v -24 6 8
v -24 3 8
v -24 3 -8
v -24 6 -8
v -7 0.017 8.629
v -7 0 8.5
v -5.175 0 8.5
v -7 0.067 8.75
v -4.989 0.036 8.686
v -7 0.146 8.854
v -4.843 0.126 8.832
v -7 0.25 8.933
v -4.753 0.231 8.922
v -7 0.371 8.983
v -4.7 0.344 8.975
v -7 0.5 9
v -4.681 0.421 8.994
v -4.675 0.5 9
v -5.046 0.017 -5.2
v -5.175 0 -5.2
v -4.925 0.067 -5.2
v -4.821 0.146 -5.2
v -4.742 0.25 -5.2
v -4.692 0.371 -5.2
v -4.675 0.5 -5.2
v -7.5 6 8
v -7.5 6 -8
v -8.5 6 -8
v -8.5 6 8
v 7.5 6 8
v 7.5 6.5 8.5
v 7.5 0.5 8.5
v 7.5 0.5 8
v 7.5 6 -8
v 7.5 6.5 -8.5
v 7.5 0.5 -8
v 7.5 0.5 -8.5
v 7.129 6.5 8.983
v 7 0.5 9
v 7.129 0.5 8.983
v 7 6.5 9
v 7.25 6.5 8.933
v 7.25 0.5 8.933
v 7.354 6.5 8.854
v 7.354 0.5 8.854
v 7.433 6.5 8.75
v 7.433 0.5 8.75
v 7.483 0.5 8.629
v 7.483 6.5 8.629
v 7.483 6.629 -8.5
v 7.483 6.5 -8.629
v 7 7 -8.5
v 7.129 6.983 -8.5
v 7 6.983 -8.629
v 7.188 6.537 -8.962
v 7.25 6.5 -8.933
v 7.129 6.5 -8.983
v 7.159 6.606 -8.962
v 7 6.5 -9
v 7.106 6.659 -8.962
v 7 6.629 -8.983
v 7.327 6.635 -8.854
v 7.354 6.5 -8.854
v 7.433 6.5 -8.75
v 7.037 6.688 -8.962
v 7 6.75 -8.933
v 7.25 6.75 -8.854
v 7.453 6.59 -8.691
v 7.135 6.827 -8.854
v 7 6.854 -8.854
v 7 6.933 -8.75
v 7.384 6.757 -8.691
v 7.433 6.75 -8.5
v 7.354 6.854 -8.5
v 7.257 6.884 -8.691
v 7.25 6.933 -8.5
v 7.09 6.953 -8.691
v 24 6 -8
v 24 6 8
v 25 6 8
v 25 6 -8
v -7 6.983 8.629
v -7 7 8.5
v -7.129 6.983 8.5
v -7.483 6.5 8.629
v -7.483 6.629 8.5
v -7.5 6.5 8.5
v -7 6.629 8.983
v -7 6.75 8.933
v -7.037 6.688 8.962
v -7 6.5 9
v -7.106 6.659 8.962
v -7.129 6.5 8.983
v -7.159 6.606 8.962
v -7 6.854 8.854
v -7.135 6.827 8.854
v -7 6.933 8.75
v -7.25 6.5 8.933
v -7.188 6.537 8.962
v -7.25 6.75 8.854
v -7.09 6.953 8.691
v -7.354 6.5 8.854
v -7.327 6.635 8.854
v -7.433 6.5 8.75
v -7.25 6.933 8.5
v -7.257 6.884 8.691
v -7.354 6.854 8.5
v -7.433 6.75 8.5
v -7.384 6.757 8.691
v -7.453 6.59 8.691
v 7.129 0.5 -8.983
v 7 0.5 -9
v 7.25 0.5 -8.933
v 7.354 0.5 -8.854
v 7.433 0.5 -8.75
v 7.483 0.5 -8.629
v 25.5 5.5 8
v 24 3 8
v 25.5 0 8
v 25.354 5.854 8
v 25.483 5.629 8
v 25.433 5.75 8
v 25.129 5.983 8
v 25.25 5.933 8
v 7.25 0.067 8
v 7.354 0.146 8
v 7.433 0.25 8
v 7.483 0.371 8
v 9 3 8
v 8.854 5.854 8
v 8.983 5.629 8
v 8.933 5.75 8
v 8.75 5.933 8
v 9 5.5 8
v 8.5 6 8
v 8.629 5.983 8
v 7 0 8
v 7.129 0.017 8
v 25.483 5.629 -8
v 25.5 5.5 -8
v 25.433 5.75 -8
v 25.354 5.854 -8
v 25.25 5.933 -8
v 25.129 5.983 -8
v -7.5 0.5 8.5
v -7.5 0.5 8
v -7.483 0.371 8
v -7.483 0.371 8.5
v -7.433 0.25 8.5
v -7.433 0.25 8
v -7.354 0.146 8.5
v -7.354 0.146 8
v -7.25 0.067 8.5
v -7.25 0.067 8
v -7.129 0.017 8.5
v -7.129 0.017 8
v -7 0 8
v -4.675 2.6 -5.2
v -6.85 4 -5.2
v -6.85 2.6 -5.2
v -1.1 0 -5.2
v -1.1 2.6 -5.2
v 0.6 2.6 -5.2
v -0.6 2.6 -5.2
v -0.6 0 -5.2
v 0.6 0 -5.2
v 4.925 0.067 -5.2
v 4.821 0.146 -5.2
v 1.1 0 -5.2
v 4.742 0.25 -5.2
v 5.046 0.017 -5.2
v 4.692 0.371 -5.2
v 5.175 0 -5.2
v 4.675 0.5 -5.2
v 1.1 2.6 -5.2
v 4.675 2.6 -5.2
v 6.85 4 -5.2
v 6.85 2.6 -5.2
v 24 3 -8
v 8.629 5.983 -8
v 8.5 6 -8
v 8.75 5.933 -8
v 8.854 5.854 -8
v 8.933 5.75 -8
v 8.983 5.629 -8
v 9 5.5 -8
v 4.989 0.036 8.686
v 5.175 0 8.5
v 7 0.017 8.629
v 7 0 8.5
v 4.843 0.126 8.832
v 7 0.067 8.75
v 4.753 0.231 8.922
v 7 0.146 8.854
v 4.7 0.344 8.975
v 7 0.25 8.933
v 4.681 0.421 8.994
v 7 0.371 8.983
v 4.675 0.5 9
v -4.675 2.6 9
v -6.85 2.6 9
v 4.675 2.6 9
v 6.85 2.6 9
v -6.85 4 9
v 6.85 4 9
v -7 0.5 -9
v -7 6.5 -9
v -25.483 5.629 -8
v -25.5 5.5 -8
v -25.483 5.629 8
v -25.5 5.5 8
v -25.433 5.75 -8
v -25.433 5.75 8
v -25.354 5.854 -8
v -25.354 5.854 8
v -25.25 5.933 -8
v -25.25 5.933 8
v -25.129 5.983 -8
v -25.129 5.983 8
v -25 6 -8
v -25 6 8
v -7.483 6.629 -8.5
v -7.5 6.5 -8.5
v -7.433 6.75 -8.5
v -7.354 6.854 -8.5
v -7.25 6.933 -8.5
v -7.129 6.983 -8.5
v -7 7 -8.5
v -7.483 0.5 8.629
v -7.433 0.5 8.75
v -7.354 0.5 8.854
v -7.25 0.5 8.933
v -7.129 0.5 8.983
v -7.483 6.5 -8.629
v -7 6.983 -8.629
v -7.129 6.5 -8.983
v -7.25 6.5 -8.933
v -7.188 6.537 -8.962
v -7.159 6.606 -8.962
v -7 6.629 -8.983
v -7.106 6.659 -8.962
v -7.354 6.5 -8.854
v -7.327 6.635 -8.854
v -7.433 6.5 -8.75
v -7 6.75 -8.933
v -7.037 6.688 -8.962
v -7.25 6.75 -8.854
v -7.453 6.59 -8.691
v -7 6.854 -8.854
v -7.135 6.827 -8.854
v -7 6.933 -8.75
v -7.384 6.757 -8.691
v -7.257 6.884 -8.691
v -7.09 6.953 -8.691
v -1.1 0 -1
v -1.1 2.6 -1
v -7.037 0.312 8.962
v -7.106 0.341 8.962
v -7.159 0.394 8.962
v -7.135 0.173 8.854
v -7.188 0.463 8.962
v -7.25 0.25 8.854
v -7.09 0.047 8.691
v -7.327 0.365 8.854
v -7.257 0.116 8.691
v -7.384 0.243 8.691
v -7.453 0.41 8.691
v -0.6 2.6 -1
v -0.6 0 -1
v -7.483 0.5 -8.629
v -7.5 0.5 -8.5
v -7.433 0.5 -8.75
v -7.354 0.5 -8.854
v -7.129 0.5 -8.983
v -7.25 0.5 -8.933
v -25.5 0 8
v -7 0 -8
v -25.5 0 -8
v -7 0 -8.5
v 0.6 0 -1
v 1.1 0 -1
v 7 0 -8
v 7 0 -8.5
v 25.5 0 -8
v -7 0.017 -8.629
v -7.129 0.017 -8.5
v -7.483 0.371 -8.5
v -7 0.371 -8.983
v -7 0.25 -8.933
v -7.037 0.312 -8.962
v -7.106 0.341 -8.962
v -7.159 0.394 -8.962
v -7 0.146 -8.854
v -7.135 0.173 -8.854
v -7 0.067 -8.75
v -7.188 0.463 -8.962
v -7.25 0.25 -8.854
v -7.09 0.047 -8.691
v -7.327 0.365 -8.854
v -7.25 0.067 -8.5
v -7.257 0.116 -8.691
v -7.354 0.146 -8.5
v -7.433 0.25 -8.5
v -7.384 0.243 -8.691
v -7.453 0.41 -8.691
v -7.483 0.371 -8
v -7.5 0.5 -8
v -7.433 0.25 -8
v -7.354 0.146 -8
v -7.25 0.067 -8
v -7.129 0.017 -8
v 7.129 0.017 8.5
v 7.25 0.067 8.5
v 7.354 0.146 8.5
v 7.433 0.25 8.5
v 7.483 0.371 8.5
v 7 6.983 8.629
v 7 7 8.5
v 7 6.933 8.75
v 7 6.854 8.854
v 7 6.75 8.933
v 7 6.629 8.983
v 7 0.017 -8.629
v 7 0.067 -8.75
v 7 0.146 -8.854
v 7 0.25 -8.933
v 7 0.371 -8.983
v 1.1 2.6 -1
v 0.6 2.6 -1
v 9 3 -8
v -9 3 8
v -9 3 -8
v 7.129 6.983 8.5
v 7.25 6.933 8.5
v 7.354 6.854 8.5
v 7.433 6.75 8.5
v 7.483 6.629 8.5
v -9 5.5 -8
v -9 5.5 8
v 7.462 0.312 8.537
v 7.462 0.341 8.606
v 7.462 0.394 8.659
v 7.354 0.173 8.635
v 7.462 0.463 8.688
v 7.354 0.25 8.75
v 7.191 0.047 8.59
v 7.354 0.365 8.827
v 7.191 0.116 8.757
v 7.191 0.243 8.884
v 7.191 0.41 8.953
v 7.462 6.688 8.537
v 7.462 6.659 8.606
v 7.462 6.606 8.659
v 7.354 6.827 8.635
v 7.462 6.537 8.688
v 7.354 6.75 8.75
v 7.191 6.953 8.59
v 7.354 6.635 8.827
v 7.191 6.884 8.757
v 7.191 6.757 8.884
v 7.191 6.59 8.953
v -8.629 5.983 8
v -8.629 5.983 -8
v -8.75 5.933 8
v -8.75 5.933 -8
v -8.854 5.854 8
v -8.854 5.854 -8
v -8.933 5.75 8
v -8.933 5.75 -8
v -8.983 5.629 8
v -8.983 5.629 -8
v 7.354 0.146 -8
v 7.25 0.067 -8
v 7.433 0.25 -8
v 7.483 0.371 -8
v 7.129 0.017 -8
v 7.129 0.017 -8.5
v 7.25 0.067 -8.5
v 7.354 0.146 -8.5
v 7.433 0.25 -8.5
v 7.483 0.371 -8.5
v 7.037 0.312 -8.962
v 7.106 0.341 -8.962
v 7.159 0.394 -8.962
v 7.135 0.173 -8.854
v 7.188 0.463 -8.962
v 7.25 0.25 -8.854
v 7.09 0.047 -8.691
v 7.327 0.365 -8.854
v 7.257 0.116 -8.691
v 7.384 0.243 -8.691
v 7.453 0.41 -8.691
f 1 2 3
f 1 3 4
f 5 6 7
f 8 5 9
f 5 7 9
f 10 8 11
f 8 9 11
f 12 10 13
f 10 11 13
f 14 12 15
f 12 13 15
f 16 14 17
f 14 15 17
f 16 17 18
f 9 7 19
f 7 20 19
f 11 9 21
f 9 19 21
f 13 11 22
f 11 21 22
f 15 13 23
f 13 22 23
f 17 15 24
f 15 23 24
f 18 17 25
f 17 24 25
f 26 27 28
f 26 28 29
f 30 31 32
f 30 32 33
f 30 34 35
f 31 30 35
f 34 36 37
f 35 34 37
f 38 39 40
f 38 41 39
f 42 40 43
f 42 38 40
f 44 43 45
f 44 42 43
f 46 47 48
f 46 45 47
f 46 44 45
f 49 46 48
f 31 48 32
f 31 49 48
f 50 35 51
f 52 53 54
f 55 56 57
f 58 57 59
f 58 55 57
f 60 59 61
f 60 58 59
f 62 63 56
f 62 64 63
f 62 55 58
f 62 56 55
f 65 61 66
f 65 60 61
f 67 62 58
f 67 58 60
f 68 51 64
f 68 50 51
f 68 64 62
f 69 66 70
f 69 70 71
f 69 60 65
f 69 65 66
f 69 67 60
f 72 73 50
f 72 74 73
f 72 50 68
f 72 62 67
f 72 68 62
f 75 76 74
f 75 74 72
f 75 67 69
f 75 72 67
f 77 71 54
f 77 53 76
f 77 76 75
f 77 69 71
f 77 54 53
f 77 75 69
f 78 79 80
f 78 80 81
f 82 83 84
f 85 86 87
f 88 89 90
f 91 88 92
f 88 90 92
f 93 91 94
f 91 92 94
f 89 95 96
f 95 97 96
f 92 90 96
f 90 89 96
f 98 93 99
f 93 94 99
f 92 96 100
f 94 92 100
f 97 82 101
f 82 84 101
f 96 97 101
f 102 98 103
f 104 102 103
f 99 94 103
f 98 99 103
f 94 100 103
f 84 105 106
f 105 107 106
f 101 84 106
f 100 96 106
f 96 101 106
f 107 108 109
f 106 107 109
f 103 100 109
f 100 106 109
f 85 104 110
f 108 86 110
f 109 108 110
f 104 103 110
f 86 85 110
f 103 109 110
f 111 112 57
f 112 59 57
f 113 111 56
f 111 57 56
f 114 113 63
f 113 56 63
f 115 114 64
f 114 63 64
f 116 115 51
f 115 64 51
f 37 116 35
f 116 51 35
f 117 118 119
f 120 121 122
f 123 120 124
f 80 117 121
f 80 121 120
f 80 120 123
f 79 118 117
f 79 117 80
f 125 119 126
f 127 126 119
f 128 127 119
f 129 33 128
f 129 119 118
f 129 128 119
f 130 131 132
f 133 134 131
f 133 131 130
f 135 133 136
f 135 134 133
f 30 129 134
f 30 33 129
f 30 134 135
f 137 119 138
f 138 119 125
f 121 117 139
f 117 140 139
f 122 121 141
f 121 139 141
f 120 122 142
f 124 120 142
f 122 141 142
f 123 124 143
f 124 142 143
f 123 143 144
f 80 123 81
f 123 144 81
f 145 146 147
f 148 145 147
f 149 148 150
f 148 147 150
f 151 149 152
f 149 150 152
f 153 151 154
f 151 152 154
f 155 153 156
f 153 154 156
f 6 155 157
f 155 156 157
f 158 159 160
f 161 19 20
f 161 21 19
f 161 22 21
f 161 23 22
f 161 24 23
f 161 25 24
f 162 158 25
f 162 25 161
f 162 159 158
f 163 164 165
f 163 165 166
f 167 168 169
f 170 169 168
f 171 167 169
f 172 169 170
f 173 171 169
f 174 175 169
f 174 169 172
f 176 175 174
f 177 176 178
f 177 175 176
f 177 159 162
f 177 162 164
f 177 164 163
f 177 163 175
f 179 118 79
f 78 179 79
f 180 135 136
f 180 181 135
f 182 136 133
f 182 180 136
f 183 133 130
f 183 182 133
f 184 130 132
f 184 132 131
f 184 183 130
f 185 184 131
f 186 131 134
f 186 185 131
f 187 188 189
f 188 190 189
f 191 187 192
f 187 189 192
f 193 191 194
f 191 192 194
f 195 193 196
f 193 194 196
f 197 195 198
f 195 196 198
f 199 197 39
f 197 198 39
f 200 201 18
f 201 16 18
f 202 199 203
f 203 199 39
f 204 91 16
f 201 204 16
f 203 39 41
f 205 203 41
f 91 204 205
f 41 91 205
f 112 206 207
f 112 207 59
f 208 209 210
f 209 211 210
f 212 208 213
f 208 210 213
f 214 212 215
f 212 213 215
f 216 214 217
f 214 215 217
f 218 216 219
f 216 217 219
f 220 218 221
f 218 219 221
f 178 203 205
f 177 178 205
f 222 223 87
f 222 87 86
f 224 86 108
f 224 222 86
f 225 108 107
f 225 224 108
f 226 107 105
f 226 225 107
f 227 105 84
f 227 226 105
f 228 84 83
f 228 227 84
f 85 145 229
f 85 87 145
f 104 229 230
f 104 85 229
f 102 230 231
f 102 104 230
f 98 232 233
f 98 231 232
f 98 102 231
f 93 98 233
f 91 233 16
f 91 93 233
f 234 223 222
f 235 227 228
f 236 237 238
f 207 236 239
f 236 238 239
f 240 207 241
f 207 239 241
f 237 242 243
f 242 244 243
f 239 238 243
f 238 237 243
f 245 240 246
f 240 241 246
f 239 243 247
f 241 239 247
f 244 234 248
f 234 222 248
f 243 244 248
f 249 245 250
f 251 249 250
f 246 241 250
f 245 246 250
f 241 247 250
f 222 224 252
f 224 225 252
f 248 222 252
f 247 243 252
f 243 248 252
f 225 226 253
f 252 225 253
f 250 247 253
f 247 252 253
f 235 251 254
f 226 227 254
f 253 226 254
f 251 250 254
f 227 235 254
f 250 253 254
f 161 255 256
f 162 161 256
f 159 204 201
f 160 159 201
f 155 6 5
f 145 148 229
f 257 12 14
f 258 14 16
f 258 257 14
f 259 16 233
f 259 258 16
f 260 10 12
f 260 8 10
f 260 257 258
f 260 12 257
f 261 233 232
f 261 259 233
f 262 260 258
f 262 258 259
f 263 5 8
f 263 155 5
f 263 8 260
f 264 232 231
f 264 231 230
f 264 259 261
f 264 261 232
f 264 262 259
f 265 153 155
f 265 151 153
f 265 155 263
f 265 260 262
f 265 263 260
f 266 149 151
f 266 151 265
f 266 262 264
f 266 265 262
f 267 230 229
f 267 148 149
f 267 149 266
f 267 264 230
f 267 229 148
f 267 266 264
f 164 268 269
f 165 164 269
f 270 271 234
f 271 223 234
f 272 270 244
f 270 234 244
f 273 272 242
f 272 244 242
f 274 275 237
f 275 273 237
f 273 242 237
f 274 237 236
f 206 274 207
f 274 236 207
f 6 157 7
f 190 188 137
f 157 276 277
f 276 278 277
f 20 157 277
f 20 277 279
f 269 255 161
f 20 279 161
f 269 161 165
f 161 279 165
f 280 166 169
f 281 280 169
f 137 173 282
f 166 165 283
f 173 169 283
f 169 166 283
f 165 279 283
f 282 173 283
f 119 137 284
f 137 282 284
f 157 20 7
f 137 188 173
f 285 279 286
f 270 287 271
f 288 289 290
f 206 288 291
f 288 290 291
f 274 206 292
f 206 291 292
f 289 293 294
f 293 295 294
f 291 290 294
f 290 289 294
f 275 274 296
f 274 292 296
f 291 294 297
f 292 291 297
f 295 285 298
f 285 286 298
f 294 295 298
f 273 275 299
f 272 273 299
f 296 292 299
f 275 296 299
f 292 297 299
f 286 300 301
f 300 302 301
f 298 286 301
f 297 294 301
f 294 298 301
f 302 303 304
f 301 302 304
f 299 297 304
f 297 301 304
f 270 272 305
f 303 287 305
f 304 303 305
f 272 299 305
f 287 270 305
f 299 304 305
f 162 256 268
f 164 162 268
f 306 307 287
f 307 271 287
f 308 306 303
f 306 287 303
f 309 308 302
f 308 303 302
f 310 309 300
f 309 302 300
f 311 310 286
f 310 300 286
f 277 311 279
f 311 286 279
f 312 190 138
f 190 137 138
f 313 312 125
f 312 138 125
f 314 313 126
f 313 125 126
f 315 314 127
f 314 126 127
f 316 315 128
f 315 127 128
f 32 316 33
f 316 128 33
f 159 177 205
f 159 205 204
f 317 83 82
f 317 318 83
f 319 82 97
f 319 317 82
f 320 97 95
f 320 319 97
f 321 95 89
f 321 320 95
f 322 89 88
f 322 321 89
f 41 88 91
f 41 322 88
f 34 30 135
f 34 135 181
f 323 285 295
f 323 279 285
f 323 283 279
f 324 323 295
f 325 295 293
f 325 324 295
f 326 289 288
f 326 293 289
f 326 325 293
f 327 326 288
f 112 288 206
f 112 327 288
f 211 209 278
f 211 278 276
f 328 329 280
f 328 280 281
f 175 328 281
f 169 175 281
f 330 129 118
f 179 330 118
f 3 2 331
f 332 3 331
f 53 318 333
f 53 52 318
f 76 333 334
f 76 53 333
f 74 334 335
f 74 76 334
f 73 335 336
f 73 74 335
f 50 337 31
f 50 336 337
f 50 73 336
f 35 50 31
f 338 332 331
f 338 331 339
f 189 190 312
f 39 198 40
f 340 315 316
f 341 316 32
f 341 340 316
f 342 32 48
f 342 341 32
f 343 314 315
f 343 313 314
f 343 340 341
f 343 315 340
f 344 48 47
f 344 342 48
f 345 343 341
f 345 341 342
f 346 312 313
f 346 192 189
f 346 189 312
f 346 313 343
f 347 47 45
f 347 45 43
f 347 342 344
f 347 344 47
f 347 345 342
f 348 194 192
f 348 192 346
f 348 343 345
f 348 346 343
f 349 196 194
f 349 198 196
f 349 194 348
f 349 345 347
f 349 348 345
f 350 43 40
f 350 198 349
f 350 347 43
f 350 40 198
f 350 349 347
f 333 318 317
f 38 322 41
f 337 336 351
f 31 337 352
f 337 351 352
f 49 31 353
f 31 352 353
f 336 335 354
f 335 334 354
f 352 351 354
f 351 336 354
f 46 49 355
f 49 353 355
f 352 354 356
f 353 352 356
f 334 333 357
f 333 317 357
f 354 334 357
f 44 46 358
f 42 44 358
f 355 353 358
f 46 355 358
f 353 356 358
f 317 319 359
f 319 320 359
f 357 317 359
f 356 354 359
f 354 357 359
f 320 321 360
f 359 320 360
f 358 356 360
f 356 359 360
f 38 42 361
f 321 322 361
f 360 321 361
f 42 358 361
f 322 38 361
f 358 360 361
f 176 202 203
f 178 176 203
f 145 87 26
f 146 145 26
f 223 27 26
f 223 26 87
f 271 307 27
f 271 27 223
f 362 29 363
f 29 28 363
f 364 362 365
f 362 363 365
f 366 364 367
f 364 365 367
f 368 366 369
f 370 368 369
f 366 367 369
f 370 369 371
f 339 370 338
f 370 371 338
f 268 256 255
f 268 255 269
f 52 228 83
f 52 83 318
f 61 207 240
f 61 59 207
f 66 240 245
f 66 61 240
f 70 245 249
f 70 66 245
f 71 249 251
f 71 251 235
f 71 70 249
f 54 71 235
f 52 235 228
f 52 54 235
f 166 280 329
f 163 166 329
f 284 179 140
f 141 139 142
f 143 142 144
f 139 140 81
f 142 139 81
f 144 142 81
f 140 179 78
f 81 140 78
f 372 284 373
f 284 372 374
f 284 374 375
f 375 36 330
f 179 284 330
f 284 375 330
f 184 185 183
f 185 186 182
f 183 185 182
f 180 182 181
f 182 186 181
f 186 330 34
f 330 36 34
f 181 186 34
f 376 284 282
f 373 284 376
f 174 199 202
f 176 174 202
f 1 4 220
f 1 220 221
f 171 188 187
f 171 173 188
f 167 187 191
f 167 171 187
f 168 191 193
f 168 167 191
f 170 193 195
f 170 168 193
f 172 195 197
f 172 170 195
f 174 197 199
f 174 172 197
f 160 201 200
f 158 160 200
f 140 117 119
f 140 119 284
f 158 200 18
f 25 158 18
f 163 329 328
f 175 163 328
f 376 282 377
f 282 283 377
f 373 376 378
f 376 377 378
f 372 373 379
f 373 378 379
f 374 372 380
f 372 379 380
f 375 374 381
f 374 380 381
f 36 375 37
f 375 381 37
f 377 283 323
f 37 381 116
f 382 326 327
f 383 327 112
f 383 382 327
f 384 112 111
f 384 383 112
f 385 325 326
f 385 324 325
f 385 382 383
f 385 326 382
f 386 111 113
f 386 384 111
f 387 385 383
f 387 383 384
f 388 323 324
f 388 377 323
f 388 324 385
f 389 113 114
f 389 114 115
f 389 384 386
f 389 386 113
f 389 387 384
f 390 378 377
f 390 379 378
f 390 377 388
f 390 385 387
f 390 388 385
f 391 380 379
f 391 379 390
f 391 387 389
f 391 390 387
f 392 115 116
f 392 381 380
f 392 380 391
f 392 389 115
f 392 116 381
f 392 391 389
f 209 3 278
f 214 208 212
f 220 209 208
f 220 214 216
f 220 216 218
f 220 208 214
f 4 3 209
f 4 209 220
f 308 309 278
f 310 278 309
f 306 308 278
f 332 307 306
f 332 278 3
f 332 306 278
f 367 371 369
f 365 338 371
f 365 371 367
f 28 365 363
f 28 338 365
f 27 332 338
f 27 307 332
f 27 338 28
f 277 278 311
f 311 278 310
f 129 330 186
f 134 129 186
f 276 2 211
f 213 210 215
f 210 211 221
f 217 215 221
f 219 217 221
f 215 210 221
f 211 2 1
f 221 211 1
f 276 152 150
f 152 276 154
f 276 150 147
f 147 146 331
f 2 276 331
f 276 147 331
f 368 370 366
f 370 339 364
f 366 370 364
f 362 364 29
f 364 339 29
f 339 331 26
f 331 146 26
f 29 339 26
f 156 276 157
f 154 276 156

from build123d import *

# Parameters (mm, degrees)
SKETCH1_W           = 15
SKETCH1_H           = 18
BOSS_EXTRUDE1_DEPTH = 7
CUT_EXTRUDE1_DEPTH  = 14.2
SKETCH8_W           = 0.5
SKETCH8_H           = 2.6
CUT_EXTRUDE4_DEPTH  = 10
SKETCH9_W           = 16
SKETCH9_H           = 6
BOSS_EXTRUDE2_DEPTH = 18
SKETCH13_W          = 16
SKETCH13_H          = 6
BOSS_EXTRUDE3_DEPTH = 18
SKETCH14_W          = 15
SKETCH14_H          = 3
CUT_EXTRUDE5_DEPTH  = 32.55
FILLET1_R           = 0.5


with BuildPart() as part:
    # Sketch1 → Boss-Extrude1 (new body)
    with BuildSketch(Plane(origin=(0, 0, 0), x_dir=(1, 0, 0), z_dir=(0, 1, 0))):
        Rectangle(SKETCH1_W, SKETCH1_H)
    extrude(amount=BOSS_EXTRUDE1_DEPTH)

    # Sketch2 → Cut-Extrude1 (cut)
    with BuildSketch(Plane.XY.offset(9)):
        Polygon((-4.675, 2.6), (-4.675, 0), (-1.1, 0), (-1.1, 2.6), (-0.6, 2.6), (-0.6, 0), (0.6, 0), (0.6, 2.6), (1.1, 2.6), (1.1, 0), (4.675, 0), (4.675, 2.6), (6.85, 2.6), (6.85, 4), (-6.85, 4), (-6.85, 2.6), align=None)
    extrude(amount=-CUT_EXTRUDE1_DEPTH, mode=Mode.SUBTRACT)

    # Sketch8 → Cut-Extrude4 (cut)
    with BuildSketch(Plane.XY.offset(9)):
        with Locations((-0.85, 1.3)):
            Rectangle(SKETCH8_W, SKETCH8_H)
        with Locations((0.85, 1.3)):
            Rectangle(SKETCH8_W, SKETCH8_H)
    extrude(amount=-CUT_EXTRUDE4_DEPTH, mode=Mode.SUBTRACT)

    # Sketch9 → Boss-Extrude2 (add)
    with BuildSketch(Plane.ZY.offset(7.5)):
        with Locations((0, 3)):
            Rectangle(SKETCH9_W, SKETCH9_H)
    extrude(amount=BOSS_EXTRUDE2_DEPTH)

    # Sketch13 → Boss-Extrude3 (add)
    with BuildSketch(Plane(origin=(7.5, 0, 0), x_dir=(0, 0, -1), z_dir=(1, 0, 0))):
        with Locations((0, 3)):
            Rectangle(SKETCH13_W, SKETCH13_H)
    extrude(amount=BOSS_EXTRUDE3_DEPTH)

    # Sketch14 → Cut-Extrude5 (cut)
    with BuildSketch(Plane.XY.offset(9)):
        with Locations((16.5, 4.5)):
            Rectangle(SKETCH14_W, SKETCH14_H)
        with Locations((-16.5, 4.5)):
            Rectangle(SKETCH14_W, SKETCH14_H)
    extrude(amount=-CUT_EXTRUDE5_DEPTH, mode=Mode.SUBTRACT)

    # Fillet1
    fillet1_edges = [part.edges().sort_by_distance(p)[0] for p in [
        (-7.5, 0, 8.5),
        (-25.5, 6, 0),
        (7.5, 0, -8.5),
        (25.5, 6, 0),
        (-7.5, 7, 0),
        (9, 6, 0),
        (-9, 6, 0),
        (6.0875, 0, 9),
        (0, 7, 9),
        (4.675, 0, 1.9),
        (-4.675, 0, 1.9),
        (7.5, 7, 0),
        (-6.0875, 0, 9),
        (-7.5, 0, -8.5),
        (0, 0, -9),
        (7.5, 0, 8.5),
        (7.5, 3.5, 9),
        (-7.5, 3.5, 9),
        (-7.5, 3.5, -9),
        (7.5, 3.5, -9),
        (0, 7, -9),
    ]]
    fillet(fillet1_edges, radius=FILLET1_R)


solid = part.part
